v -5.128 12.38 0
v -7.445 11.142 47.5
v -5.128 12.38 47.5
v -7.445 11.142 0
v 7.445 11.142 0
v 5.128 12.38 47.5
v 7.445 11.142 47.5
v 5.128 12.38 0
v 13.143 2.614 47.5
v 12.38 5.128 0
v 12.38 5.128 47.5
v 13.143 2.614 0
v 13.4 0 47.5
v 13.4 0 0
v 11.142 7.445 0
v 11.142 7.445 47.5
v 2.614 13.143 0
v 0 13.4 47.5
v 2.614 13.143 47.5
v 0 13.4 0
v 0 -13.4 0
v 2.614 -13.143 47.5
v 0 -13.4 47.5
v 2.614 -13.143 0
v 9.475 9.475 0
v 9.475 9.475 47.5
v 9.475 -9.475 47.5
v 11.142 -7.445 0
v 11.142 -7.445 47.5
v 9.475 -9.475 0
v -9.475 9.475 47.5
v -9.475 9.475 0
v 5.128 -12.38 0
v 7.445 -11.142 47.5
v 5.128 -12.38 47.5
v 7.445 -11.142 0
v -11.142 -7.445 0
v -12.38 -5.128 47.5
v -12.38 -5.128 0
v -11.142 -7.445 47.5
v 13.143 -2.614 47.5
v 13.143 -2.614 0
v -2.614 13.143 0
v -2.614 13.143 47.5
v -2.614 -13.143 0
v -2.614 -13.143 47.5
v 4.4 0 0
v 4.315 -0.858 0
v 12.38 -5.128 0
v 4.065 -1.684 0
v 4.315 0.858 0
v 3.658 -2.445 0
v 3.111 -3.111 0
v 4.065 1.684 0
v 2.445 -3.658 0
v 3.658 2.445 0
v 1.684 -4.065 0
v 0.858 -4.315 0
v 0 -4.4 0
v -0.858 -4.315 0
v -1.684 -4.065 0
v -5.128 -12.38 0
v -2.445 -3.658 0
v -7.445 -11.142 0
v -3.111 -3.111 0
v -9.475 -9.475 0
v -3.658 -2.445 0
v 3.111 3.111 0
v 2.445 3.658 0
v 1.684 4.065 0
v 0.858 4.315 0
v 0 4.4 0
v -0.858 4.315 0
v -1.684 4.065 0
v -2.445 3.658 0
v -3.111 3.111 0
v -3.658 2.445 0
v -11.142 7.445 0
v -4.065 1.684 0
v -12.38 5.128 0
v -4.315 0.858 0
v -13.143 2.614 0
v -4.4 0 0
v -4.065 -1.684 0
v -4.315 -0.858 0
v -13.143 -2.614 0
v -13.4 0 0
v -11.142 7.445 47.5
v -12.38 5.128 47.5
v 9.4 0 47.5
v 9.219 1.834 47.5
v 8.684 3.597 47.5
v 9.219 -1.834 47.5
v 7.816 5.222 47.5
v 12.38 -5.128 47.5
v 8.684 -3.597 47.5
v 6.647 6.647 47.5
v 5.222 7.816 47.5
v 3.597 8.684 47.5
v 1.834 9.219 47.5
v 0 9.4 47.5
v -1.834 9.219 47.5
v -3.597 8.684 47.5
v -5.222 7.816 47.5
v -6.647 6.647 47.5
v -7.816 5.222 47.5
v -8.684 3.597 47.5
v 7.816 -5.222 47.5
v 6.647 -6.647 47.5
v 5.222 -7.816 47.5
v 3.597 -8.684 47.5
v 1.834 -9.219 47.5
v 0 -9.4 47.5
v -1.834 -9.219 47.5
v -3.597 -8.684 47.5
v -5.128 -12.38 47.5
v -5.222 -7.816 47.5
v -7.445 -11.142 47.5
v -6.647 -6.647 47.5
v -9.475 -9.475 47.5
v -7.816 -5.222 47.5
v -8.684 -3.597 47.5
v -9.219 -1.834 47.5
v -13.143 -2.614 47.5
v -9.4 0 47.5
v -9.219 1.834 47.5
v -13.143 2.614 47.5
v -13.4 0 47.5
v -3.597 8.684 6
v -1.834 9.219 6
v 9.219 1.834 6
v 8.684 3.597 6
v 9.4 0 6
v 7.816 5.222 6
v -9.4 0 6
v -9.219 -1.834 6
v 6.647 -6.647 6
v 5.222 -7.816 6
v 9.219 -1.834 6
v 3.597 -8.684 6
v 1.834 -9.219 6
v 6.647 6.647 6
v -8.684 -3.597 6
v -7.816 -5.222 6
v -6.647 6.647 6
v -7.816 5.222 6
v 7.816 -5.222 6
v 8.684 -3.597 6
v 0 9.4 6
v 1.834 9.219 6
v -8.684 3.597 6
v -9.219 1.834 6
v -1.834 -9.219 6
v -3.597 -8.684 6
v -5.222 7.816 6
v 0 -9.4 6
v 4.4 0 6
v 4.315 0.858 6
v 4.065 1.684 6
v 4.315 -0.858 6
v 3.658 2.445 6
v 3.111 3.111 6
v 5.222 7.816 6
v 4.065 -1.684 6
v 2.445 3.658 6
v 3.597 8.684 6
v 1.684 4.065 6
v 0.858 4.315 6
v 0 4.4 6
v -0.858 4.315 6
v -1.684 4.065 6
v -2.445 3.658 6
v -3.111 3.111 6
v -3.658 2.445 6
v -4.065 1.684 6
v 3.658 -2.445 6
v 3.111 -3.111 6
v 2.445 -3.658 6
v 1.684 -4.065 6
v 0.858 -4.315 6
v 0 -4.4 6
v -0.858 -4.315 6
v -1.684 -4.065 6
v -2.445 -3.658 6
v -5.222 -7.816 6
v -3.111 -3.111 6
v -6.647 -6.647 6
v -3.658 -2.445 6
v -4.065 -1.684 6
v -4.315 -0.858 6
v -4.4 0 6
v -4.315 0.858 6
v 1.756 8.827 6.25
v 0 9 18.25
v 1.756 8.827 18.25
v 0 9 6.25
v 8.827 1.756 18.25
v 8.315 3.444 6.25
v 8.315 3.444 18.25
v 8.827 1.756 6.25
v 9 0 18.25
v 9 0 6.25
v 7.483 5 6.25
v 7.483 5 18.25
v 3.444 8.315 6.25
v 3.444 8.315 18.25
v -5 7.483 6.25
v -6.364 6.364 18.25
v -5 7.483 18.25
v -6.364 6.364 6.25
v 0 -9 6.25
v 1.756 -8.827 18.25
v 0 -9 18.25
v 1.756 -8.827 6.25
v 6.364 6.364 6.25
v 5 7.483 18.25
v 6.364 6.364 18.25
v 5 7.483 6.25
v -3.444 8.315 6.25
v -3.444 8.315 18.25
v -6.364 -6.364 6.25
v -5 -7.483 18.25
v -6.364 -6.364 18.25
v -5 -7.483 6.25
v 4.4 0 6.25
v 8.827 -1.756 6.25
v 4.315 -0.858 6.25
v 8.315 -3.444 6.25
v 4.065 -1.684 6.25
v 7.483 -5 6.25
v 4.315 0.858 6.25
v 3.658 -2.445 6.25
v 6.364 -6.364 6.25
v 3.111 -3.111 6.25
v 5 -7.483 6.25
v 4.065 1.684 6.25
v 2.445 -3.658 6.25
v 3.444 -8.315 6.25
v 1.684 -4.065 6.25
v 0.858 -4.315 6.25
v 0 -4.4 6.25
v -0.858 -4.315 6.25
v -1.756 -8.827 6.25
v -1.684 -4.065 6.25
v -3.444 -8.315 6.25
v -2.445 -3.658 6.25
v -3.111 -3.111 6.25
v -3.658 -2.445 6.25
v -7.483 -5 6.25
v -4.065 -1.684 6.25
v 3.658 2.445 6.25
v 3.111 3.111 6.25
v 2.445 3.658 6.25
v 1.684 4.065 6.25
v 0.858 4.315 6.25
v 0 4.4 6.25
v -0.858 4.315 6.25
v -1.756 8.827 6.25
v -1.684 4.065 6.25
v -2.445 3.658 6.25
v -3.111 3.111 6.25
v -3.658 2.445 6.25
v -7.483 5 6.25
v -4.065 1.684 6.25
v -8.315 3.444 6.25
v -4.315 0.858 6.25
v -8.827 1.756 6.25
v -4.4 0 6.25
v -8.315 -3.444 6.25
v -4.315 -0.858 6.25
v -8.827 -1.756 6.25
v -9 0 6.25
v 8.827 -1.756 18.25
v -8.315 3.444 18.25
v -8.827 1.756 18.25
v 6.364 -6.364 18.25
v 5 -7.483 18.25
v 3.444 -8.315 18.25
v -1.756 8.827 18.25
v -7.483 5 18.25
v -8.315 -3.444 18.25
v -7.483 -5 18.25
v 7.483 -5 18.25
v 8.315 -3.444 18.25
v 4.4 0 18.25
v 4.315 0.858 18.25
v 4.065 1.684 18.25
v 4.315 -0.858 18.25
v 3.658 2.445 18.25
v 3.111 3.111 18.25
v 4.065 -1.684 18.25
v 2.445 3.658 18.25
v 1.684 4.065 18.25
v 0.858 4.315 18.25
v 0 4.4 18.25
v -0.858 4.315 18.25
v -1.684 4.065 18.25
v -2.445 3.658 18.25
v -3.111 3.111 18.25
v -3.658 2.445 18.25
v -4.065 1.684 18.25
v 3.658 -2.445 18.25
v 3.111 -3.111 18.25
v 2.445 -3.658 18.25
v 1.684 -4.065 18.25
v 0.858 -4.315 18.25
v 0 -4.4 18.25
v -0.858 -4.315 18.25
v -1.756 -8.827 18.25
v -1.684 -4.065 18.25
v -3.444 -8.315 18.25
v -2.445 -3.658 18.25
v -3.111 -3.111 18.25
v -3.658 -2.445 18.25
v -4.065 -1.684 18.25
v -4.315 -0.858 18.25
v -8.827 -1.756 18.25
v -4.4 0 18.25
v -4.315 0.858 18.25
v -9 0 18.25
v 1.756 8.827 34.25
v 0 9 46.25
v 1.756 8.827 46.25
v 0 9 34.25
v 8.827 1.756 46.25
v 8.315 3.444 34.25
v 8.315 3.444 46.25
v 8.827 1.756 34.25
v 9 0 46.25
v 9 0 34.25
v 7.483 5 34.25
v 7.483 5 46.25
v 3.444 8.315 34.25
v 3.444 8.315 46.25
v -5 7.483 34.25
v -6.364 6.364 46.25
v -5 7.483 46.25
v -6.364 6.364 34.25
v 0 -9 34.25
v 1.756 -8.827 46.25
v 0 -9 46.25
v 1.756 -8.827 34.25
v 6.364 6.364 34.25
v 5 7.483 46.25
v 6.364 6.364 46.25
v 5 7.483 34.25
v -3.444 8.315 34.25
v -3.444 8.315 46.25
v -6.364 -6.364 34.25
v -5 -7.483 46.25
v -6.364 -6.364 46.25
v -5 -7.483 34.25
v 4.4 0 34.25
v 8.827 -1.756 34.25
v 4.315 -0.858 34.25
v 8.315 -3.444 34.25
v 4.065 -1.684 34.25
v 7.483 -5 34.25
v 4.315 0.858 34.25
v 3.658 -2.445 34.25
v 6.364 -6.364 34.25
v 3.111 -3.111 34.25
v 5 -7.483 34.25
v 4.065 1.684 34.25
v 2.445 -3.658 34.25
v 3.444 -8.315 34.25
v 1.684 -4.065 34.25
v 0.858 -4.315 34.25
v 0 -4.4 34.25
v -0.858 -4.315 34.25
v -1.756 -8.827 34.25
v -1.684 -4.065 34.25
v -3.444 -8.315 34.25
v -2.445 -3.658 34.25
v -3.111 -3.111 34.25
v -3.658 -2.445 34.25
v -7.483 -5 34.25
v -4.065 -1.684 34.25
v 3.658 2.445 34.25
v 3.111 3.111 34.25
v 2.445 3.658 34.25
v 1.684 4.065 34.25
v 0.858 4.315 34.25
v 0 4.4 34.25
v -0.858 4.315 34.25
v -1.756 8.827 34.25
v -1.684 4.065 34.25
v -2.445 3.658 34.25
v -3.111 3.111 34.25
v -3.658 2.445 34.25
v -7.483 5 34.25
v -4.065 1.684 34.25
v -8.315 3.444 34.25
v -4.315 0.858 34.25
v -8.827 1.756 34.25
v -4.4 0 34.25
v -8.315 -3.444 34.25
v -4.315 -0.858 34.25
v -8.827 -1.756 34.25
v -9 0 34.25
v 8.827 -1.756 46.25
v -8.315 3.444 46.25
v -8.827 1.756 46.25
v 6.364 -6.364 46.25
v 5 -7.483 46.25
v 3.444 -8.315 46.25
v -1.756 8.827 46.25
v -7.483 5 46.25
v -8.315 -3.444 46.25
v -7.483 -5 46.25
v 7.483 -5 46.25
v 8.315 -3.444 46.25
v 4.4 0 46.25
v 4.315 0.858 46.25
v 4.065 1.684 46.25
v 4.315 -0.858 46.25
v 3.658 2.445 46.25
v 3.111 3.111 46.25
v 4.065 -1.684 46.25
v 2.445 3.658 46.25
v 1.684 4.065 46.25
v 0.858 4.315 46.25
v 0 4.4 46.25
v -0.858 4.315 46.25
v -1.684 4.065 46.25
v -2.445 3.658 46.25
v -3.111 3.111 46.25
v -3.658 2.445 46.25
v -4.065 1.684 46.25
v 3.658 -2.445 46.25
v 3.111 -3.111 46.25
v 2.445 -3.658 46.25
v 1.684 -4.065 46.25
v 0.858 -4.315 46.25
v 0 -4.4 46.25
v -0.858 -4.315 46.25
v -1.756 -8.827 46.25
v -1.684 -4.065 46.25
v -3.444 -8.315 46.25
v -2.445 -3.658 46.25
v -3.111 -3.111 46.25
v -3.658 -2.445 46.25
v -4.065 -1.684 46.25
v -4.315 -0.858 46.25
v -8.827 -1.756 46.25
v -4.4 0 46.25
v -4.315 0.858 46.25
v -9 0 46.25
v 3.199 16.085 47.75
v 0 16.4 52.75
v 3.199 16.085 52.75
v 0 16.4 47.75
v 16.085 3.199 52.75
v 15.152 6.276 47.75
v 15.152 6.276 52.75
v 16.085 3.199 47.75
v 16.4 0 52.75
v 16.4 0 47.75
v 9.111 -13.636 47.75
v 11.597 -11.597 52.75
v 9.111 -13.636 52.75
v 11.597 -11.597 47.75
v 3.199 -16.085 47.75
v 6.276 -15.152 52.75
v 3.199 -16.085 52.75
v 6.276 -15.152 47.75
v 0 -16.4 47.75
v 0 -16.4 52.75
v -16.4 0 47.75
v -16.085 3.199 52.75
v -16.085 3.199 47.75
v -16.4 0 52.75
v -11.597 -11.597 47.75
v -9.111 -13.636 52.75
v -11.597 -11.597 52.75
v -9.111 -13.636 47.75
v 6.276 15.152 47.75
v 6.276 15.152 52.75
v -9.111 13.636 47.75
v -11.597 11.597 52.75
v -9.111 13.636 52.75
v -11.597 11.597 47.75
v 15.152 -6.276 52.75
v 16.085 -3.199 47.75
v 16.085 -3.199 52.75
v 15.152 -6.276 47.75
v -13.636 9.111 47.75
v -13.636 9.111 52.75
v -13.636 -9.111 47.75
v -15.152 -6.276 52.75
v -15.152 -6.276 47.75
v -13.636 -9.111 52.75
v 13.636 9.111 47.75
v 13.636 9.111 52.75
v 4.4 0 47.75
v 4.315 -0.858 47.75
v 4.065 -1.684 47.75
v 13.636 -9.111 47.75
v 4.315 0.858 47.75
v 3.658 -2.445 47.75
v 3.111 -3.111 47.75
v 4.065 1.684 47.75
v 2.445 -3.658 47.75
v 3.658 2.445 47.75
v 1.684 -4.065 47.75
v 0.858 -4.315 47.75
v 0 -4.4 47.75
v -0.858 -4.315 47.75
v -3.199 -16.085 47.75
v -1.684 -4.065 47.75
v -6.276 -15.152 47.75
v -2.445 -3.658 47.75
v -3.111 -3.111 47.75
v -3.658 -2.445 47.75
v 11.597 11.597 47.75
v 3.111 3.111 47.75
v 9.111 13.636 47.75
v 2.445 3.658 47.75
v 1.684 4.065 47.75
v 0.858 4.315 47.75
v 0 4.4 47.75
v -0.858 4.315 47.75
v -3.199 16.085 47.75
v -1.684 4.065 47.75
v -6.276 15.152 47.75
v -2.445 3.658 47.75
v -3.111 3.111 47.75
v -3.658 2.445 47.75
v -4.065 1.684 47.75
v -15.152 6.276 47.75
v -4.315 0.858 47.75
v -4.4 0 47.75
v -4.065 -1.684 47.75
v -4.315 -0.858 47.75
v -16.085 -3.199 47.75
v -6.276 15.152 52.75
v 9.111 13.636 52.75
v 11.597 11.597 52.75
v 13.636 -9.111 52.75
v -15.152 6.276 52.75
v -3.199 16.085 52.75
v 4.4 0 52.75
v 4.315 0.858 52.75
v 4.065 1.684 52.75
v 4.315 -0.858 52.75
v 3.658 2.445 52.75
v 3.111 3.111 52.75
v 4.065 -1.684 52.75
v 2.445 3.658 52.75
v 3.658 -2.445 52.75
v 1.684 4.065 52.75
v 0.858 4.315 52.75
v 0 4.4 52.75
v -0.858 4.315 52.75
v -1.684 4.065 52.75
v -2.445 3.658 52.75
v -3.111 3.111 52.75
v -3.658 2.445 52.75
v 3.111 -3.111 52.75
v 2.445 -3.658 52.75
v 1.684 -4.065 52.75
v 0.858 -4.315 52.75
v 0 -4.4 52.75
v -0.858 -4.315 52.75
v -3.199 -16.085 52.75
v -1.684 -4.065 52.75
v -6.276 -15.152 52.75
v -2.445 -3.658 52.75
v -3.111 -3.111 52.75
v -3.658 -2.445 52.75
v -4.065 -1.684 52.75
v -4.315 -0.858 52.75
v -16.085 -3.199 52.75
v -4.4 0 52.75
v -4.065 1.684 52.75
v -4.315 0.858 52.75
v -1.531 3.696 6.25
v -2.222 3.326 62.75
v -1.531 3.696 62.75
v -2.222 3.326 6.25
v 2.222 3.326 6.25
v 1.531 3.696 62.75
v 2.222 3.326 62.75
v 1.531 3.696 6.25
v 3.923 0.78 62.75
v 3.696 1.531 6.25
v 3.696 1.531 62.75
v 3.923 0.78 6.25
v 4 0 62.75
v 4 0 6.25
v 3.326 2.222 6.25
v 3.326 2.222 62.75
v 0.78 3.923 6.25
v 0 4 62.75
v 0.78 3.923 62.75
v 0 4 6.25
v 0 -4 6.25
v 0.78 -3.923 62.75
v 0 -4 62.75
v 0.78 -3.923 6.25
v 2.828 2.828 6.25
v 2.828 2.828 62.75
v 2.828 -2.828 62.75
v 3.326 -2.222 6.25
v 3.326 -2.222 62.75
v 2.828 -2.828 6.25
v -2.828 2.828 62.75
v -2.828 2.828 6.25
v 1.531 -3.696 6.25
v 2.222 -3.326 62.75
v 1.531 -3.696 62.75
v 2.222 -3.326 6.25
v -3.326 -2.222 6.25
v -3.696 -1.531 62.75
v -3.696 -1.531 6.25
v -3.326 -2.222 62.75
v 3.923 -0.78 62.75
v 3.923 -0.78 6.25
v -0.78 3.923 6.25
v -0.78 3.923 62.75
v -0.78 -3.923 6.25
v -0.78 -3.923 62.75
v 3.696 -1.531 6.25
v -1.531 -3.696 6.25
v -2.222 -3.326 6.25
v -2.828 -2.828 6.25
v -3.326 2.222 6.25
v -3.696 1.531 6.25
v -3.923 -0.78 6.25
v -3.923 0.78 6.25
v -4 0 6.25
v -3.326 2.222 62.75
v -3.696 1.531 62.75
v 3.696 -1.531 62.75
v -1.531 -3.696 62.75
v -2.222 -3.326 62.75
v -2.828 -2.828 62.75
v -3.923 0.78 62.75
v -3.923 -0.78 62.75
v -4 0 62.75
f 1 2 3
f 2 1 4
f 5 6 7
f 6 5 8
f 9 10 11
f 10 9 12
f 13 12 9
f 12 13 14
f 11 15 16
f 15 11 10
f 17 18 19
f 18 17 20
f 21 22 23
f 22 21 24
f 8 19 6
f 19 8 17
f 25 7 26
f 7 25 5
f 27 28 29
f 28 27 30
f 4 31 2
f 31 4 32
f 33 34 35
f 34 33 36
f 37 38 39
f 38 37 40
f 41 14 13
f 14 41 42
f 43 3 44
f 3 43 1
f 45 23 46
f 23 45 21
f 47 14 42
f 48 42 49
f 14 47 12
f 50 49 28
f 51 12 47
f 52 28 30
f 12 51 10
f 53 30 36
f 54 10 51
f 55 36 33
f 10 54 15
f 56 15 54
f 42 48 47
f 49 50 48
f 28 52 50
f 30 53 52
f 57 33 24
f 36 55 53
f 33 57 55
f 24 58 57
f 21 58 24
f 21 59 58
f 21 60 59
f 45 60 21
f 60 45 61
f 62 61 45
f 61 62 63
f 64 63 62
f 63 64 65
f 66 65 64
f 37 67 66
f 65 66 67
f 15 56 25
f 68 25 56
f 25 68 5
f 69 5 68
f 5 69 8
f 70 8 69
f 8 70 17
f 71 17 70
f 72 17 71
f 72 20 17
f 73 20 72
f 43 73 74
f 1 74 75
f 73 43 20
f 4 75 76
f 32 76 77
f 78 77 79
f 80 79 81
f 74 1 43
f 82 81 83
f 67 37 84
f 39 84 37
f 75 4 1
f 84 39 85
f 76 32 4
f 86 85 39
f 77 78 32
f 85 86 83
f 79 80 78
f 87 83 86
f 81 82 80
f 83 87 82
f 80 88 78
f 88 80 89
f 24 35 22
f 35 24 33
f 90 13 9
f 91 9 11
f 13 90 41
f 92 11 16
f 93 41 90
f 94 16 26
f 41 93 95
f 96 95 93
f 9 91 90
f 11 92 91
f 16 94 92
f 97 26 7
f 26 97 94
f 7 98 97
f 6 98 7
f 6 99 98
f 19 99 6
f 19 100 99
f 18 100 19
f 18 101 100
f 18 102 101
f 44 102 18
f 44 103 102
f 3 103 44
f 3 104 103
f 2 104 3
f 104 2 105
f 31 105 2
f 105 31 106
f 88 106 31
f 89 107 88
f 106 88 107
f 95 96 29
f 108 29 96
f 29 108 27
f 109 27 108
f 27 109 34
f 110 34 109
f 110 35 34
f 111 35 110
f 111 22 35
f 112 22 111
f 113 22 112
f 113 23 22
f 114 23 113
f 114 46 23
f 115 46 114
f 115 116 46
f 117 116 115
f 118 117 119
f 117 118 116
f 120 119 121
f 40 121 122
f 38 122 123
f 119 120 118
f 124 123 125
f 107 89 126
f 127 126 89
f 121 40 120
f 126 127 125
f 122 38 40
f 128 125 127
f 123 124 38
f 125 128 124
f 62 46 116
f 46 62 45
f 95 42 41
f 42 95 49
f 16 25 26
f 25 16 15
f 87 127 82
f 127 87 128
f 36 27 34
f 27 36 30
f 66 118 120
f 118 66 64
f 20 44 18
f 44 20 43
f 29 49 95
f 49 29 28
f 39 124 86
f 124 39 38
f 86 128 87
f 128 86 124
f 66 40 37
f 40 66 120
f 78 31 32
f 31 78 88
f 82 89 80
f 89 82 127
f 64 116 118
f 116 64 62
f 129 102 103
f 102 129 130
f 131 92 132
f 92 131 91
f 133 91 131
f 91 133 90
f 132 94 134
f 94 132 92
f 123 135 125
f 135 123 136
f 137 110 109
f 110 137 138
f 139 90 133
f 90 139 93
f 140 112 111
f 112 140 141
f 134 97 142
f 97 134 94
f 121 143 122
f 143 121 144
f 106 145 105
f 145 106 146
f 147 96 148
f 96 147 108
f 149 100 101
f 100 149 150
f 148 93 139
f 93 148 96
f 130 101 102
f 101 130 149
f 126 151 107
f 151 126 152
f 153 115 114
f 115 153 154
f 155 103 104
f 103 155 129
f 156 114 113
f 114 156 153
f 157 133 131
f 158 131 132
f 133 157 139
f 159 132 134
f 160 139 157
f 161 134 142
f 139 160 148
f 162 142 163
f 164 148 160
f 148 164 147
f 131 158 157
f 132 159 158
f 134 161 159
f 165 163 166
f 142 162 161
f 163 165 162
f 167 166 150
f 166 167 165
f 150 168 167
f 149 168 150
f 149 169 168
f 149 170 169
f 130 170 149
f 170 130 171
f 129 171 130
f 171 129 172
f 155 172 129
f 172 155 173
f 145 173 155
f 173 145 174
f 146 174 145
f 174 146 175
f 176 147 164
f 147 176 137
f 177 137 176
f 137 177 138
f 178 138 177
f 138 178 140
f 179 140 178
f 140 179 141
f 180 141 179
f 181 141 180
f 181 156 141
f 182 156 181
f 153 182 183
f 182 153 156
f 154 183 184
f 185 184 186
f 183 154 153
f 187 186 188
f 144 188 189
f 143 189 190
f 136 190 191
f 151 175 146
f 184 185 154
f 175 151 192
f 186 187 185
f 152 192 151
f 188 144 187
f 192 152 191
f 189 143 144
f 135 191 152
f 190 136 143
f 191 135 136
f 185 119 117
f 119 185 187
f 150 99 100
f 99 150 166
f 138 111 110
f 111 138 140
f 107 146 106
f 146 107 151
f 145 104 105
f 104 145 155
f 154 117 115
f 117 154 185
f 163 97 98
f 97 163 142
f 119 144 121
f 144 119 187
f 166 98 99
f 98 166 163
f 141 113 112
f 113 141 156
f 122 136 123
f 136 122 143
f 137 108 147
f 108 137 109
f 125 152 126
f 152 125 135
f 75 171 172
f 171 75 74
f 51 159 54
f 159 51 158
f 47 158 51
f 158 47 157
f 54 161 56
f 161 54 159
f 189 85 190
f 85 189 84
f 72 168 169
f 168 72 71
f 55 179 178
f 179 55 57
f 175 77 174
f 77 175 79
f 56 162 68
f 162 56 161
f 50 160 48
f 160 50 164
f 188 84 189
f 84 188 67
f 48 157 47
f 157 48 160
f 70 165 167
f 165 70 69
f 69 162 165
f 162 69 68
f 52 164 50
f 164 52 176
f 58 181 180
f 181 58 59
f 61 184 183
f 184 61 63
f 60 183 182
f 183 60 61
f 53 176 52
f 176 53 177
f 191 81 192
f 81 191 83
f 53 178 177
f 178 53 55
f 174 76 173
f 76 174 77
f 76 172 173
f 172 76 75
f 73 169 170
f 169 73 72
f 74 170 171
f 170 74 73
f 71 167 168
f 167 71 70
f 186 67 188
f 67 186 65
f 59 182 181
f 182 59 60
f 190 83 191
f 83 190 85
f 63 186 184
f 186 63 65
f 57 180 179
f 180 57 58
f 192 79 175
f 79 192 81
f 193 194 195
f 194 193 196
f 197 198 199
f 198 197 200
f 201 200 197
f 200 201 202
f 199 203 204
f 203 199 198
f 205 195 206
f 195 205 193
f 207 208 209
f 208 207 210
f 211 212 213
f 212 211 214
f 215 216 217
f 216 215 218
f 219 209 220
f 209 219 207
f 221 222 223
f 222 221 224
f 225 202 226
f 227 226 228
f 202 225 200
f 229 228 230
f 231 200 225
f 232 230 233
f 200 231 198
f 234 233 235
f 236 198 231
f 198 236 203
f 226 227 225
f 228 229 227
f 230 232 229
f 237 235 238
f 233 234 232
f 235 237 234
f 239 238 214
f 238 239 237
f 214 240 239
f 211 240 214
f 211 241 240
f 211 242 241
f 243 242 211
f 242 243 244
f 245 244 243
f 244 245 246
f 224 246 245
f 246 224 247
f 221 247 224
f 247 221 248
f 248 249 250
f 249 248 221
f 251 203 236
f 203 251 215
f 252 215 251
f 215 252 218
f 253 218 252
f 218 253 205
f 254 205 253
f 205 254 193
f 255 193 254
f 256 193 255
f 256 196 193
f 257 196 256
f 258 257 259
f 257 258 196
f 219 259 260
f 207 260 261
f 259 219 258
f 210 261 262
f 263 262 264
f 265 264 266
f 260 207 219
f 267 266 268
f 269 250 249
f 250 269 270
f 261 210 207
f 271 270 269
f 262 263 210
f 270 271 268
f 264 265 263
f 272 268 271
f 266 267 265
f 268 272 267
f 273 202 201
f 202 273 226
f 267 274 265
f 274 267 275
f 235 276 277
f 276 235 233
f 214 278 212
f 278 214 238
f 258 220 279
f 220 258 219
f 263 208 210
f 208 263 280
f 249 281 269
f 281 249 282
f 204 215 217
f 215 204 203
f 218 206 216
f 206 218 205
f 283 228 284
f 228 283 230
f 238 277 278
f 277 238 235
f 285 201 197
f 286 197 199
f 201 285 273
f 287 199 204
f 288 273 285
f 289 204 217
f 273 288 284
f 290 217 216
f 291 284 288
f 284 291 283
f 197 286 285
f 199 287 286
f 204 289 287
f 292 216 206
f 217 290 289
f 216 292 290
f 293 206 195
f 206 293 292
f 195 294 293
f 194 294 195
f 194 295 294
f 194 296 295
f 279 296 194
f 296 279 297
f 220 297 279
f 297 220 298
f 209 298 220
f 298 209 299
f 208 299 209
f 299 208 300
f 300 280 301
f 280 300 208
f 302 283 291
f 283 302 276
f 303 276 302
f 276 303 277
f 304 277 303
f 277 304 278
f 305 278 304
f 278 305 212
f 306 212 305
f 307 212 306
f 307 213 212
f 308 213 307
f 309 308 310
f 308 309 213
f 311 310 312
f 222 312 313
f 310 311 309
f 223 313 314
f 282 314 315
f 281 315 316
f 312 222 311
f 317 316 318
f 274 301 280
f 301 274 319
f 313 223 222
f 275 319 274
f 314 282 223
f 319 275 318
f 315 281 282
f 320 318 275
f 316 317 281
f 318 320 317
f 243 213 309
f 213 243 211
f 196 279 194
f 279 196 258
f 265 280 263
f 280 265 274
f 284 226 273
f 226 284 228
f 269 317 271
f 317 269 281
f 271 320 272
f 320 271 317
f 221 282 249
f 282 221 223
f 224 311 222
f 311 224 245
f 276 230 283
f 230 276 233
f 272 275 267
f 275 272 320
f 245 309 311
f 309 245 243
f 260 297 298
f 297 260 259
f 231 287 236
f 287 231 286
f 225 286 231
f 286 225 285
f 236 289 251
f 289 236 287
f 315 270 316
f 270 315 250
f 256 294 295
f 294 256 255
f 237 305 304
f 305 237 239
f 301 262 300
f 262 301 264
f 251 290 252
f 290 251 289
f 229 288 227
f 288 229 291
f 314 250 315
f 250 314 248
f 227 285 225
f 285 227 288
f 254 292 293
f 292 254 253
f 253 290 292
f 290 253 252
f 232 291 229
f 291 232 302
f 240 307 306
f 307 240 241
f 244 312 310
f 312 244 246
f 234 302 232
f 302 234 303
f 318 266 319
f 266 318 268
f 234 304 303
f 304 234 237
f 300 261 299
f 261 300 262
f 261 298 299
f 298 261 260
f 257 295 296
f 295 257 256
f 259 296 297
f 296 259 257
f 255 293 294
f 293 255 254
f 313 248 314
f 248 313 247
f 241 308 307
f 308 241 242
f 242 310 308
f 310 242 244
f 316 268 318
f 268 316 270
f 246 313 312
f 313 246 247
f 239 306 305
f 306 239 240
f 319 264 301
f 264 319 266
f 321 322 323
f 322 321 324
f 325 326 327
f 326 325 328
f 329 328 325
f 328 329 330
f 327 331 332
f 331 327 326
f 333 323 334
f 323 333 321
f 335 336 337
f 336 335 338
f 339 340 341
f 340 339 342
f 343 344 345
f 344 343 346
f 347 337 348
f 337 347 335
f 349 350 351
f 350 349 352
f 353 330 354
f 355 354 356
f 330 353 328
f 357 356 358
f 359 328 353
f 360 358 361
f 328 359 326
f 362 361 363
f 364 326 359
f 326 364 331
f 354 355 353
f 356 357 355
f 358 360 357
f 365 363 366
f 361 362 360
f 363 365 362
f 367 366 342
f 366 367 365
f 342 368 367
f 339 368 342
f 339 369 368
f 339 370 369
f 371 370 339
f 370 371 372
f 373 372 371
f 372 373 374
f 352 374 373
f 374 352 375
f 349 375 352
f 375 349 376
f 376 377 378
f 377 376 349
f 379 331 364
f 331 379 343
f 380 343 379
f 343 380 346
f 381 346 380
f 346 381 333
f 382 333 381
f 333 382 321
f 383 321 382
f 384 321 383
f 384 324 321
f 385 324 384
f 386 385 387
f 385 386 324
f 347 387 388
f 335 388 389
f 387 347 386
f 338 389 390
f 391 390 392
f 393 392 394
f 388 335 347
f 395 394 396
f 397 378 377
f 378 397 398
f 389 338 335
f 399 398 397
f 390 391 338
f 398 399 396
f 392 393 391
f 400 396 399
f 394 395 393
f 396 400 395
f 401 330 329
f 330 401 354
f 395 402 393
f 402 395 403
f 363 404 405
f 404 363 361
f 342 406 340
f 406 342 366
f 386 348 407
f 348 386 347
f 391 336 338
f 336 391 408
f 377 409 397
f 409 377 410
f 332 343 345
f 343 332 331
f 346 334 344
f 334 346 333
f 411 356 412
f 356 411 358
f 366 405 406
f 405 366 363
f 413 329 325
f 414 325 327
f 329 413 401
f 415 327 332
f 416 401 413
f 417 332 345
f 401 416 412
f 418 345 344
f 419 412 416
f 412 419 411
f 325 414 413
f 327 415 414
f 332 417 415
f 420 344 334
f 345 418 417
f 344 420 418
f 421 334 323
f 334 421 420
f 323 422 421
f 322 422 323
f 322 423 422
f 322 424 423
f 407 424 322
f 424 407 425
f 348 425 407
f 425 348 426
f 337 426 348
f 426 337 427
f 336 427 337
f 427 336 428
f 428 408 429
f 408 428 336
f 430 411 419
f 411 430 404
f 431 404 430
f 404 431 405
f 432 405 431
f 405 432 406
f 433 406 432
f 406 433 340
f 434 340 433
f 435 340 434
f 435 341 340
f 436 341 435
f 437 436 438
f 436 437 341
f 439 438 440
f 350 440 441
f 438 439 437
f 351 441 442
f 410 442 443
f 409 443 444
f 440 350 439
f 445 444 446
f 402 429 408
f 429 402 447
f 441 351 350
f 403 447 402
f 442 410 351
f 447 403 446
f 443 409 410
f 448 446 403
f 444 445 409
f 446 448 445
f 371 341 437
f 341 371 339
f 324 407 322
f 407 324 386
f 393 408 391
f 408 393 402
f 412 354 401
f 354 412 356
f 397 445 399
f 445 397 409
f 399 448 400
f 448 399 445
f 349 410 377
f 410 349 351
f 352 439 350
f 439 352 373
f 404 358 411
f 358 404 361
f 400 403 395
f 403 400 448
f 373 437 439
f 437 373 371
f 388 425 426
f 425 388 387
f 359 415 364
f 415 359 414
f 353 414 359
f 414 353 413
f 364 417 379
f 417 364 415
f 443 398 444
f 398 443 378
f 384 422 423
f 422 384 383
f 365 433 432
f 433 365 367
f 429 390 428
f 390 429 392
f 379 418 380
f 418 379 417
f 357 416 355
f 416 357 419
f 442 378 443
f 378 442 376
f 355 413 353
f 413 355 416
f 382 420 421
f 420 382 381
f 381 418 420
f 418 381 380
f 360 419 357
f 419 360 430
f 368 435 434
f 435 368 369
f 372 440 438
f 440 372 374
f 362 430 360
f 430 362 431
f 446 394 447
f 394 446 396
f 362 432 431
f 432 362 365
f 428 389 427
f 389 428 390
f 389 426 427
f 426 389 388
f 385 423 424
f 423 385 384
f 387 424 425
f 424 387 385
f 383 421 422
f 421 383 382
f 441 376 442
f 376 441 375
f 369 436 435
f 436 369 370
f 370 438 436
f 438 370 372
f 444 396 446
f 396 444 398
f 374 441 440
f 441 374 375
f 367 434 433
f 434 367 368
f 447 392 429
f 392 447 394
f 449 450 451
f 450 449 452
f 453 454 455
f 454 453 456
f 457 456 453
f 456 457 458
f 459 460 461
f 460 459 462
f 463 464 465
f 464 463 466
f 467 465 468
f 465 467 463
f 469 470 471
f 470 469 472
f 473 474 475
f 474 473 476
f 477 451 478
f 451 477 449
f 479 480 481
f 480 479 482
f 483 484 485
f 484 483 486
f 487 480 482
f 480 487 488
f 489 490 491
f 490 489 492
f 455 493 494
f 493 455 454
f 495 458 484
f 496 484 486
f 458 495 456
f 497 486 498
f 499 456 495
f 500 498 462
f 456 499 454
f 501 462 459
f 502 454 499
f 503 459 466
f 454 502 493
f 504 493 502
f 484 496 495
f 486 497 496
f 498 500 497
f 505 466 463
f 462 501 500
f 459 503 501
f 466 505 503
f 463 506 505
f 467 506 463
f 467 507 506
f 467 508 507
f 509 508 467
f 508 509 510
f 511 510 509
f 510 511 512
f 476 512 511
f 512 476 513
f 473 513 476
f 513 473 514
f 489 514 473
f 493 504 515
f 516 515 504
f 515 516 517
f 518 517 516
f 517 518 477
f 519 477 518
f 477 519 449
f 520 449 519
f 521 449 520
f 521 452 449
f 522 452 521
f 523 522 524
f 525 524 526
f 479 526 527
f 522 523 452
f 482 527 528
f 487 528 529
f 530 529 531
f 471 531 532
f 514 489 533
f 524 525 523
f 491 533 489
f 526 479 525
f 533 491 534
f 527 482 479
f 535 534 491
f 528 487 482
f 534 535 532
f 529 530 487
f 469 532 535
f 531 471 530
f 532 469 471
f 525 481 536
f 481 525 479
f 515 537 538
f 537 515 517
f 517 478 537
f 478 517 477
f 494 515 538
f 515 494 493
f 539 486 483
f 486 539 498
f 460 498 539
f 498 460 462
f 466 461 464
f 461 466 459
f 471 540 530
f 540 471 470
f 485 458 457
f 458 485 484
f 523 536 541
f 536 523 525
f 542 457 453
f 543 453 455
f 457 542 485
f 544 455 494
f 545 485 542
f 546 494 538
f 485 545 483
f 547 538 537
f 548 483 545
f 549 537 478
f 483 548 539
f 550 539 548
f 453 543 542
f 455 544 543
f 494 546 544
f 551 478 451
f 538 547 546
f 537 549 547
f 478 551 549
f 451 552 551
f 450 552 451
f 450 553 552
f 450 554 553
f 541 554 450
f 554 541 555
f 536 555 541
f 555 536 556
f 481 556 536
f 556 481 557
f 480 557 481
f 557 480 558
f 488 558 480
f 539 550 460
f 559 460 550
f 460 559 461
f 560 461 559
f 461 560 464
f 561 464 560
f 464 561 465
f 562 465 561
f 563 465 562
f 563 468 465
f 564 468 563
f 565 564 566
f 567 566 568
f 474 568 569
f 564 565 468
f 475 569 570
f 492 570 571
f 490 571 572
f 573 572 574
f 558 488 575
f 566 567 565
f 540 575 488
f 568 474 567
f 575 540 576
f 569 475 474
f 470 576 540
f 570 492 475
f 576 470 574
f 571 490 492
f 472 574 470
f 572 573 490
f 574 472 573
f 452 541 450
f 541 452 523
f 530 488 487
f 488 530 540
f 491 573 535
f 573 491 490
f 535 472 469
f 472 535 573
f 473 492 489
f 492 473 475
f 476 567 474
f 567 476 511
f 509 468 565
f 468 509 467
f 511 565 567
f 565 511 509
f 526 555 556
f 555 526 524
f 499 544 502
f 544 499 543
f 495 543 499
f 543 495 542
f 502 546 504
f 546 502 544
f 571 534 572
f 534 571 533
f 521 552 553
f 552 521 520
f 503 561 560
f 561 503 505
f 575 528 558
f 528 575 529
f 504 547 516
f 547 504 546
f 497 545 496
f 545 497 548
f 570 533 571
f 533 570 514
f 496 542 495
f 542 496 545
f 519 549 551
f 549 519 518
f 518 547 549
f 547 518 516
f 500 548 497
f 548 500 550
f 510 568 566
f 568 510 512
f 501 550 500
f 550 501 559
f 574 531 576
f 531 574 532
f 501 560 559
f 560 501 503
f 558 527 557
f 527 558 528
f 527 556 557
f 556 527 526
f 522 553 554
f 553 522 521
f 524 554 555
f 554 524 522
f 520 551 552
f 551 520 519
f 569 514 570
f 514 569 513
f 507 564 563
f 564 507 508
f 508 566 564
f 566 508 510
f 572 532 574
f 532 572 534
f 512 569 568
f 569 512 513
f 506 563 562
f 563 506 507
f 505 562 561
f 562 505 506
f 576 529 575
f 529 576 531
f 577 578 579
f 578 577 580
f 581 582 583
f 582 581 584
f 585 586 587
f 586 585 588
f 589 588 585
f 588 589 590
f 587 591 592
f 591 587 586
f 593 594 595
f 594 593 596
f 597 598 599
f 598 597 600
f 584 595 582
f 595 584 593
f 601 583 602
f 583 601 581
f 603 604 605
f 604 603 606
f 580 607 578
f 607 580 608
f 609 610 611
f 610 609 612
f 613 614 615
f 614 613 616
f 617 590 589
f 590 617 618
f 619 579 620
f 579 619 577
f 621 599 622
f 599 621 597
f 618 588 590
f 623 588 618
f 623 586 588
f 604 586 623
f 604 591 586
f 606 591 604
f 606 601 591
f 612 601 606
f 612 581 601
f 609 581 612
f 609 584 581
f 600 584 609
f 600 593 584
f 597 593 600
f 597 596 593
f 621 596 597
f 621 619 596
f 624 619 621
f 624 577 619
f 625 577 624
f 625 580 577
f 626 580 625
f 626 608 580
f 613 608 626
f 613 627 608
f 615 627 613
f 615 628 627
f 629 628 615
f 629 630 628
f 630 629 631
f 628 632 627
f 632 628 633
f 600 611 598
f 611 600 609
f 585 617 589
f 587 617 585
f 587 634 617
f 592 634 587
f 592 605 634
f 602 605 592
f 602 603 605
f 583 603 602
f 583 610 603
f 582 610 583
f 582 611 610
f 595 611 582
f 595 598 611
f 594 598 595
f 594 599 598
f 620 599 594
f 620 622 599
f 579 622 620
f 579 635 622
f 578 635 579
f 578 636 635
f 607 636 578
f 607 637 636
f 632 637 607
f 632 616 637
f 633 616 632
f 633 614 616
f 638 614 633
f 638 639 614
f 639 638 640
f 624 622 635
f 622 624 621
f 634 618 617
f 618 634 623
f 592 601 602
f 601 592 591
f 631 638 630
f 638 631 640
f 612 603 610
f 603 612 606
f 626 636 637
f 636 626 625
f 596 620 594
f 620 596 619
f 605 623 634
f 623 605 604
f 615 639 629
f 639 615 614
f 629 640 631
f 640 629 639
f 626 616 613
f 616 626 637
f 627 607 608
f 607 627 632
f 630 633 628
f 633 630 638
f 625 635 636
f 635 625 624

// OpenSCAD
$fn = 32;

// ------------------------------------------------------------------------
// Shaft station: cup d26.8 x 47.5 mm, shaft d8
// Every part is its own module, assembly() places every instance.
// ------------------------------------------------------------------------

// --- part 1 ---
module housing_cup() {
  difference() {
    cylinder(h = 47.5, d = 26.8);
    translate([0, 0, 6]) cylinder(h = 42.5, d = 18.8);
    translate([0, 0, -1]) cylinder(h = 8, d = 8.8);
  }
}

// --- part 2 ---
module bearing_lower() {
  difference() {
      translate([0, 0, 0]) cylinder(h = 12, d = 18);
      translate([0, 0, -1]) cylinder(h = 14, d = 8.8);
    }
}

// --- part 3 ---
module bearing_upper() {
  difference() {
      translate([0, 0, 0]) cylinder(h = 12, d = 18);
      translate([0, 0, -1]) cylinder(h = 14, d = 8.8);
    }
}

// --- part 4 ---
module station_shaft() {
  translate([0, 0, -28.25]) cylinder(h = 56.5, d = 8);
}

// --- part 5 ---
module station_cover() {
  difference() {
    cylinder(h = 5, d = 32.8);
    translate([0, 0, -1]) cylinder(h = 7, d = 8.8);
  }
}

// --- assembly ---
module assembly() {
  color([0.80, 0.24, 0.20]) translate([0, 0, 0]) rotate([0, 0, 0]) housing_cup();
  color([0.20, 0.45, 0.75]) translate([0, 0, 6.25]) rotate([0, 0, 0]) bearing_lower();
  color([0.25, 0.62, 0.32]) translate([0, 0, 34.25]) rotate([0, 0, 0]) bearing_upper();
  color([0.92, 0.70, 0.18]) translate([0, 0, 34.5]) rotate([0, 0, 0]) station_shaft();
  color([0.58, 0.35, 0.70]) translate([0, 0, 47.75]) rotate([0, 0, 0]) station_cover();
}

assembly();
